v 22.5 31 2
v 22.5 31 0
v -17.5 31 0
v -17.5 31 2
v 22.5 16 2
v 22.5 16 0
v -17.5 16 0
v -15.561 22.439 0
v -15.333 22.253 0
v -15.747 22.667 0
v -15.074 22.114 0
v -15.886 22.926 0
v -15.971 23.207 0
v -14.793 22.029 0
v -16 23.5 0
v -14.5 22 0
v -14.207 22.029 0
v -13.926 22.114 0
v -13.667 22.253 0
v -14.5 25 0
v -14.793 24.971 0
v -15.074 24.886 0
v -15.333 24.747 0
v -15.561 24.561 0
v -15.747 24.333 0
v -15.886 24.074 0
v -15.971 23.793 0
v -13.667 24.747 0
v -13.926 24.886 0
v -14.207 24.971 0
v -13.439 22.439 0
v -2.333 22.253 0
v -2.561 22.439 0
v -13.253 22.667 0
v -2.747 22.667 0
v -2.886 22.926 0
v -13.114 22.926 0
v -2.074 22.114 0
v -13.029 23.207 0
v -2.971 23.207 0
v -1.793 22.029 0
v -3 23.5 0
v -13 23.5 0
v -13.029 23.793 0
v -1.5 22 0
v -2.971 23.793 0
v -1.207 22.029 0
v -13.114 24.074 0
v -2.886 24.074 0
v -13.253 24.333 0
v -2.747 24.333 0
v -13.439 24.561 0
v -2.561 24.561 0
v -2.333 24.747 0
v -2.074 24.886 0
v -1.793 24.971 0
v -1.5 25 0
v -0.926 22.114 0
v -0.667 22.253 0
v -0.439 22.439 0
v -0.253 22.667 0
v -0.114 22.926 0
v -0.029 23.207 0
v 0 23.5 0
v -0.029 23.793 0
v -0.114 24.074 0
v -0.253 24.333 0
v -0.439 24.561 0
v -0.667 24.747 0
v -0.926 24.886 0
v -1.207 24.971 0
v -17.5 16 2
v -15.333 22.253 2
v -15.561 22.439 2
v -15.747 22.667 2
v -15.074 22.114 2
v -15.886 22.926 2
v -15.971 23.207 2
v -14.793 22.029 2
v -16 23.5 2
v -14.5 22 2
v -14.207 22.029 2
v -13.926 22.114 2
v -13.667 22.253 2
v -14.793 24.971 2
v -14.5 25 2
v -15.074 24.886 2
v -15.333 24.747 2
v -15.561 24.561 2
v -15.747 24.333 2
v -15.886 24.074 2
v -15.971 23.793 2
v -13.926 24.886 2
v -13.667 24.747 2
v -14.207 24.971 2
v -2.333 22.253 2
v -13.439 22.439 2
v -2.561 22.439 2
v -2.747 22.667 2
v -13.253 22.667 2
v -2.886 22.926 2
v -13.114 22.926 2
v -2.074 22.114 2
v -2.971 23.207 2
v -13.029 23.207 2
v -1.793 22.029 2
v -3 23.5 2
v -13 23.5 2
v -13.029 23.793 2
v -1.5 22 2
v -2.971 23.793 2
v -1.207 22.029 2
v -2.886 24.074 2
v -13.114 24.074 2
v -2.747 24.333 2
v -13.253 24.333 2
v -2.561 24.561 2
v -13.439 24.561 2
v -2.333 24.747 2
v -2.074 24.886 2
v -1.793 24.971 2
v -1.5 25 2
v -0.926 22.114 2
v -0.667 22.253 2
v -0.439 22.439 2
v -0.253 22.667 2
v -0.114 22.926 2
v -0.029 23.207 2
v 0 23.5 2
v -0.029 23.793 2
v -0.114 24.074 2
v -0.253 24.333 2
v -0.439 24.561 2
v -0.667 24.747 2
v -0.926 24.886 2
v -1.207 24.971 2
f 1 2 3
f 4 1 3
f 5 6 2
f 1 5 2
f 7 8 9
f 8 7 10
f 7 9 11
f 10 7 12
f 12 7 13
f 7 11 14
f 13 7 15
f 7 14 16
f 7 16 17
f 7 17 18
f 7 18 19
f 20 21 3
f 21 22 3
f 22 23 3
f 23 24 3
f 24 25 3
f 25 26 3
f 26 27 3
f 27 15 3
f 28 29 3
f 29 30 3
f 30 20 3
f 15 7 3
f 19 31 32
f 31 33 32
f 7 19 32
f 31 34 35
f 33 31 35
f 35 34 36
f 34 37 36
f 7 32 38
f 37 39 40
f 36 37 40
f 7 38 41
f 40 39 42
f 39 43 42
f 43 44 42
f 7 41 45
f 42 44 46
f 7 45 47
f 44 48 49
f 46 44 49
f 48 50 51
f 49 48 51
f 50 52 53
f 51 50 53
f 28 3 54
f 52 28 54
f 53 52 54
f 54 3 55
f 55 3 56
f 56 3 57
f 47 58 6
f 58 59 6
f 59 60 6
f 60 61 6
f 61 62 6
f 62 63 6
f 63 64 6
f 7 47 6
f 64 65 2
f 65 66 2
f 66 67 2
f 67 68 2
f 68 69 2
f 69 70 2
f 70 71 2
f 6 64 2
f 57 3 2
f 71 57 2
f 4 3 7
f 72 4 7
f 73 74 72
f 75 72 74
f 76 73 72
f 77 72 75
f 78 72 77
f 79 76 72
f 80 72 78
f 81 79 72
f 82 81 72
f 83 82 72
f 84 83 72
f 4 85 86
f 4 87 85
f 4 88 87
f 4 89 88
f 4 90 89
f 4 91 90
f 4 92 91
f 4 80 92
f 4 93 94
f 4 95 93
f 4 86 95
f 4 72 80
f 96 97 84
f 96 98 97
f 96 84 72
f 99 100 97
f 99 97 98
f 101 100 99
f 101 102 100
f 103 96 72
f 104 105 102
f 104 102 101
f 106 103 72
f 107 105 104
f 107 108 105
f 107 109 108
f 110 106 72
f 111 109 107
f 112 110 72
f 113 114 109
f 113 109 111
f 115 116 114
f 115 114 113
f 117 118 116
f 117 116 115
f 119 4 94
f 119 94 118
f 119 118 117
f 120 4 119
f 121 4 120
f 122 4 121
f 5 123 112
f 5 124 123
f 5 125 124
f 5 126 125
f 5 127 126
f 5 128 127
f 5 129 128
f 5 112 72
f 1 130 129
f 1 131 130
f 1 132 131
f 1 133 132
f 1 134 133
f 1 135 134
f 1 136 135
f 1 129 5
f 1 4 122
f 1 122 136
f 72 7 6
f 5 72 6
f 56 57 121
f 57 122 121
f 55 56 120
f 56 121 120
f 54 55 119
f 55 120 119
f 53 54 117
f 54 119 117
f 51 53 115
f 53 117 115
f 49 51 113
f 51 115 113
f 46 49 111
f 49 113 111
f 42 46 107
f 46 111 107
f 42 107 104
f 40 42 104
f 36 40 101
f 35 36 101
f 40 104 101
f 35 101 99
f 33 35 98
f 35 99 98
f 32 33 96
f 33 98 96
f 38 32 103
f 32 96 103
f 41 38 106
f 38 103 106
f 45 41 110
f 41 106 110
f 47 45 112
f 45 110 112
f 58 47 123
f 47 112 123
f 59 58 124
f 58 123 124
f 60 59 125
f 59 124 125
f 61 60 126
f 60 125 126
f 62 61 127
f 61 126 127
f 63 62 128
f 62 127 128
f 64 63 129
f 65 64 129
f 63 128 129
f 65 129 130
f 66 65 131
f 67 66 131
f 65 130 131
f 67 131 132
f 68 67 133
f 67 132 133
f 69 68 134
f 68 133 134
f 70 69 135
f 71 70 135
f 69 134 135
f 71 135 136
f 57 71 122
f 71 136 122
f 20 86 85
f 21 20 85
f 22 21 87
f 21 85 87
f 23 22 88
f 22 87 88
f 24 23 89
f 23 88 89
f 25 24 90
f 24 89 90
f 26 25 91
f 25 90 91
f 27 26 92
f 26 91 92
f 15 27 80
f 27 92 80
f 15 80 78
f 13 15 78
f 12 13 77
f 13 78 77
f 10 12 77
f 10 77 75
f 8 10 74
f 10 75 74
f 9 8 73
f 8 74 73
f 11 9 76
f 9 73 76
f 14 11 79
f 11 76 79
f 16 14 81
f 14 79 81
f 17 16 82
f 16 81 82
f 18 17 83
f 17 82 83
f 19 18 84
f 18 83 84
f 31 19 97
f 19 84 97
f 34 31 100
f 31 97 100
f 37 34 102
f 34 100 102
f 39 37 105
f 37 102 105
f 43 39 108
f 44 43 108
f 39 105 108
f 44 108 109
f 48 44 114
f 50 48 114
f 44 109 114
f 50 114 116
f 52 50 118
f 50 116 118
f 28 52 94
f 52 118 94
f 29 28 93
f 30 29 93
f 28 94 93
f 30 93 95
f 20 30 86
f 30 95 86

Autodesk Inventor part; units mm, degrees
ref_plane "YZ Plane" through (0, 0, 0) normal (1, 0, 0) x (0, 1, 0)
ref_plane "XZ Plane" through (0, 0, 0) normal (0, 1, 0) x (-1, 0, 0)
ref_plane "XY Plane" through (0, 0, 0) normal (0, 0, 1) x (1, 0, 0)
ref_plane "Work Plane1" through (0, 0, 0) normal (0, 0, 1) x (1, 0, 0)
sketch "Sketch2" plane through (0, 0, 0) normal (0, 0, 1) x (1, 0, 0)
  line L0 (22.5, 31) -> (-17.5, 31)
  line L1 (-17.5, 31) -> (-17.5, 16)
  line L2 (-17.5, 16) -> (22.5, 16)
  line L3 (22.5, 16) -> (22.5, 31)
  point P0 (0, 0)
  dimension "d1" = 15
  dimension "d4" = 40
  dimension "d5" = 22.5
  dimension "d6" = 31
extrude "Extrusion1" add sketch "Sketch2" along normal blind 2
hole "Hole1" at (-14.5, 23.5, 0) direction (0, 0, 1) diameter 3 end through all
hole "Hole2" at (-1.5, 23.5, 0) direction (0, 0, 1) diameter 3 end through all
equation "\"d8\" = 0.5 * d1"
equation "\"d17\" = 0.5 * d1"
properties part number "HTD-5M-belt-clamp" material "Aluminum 6061"
